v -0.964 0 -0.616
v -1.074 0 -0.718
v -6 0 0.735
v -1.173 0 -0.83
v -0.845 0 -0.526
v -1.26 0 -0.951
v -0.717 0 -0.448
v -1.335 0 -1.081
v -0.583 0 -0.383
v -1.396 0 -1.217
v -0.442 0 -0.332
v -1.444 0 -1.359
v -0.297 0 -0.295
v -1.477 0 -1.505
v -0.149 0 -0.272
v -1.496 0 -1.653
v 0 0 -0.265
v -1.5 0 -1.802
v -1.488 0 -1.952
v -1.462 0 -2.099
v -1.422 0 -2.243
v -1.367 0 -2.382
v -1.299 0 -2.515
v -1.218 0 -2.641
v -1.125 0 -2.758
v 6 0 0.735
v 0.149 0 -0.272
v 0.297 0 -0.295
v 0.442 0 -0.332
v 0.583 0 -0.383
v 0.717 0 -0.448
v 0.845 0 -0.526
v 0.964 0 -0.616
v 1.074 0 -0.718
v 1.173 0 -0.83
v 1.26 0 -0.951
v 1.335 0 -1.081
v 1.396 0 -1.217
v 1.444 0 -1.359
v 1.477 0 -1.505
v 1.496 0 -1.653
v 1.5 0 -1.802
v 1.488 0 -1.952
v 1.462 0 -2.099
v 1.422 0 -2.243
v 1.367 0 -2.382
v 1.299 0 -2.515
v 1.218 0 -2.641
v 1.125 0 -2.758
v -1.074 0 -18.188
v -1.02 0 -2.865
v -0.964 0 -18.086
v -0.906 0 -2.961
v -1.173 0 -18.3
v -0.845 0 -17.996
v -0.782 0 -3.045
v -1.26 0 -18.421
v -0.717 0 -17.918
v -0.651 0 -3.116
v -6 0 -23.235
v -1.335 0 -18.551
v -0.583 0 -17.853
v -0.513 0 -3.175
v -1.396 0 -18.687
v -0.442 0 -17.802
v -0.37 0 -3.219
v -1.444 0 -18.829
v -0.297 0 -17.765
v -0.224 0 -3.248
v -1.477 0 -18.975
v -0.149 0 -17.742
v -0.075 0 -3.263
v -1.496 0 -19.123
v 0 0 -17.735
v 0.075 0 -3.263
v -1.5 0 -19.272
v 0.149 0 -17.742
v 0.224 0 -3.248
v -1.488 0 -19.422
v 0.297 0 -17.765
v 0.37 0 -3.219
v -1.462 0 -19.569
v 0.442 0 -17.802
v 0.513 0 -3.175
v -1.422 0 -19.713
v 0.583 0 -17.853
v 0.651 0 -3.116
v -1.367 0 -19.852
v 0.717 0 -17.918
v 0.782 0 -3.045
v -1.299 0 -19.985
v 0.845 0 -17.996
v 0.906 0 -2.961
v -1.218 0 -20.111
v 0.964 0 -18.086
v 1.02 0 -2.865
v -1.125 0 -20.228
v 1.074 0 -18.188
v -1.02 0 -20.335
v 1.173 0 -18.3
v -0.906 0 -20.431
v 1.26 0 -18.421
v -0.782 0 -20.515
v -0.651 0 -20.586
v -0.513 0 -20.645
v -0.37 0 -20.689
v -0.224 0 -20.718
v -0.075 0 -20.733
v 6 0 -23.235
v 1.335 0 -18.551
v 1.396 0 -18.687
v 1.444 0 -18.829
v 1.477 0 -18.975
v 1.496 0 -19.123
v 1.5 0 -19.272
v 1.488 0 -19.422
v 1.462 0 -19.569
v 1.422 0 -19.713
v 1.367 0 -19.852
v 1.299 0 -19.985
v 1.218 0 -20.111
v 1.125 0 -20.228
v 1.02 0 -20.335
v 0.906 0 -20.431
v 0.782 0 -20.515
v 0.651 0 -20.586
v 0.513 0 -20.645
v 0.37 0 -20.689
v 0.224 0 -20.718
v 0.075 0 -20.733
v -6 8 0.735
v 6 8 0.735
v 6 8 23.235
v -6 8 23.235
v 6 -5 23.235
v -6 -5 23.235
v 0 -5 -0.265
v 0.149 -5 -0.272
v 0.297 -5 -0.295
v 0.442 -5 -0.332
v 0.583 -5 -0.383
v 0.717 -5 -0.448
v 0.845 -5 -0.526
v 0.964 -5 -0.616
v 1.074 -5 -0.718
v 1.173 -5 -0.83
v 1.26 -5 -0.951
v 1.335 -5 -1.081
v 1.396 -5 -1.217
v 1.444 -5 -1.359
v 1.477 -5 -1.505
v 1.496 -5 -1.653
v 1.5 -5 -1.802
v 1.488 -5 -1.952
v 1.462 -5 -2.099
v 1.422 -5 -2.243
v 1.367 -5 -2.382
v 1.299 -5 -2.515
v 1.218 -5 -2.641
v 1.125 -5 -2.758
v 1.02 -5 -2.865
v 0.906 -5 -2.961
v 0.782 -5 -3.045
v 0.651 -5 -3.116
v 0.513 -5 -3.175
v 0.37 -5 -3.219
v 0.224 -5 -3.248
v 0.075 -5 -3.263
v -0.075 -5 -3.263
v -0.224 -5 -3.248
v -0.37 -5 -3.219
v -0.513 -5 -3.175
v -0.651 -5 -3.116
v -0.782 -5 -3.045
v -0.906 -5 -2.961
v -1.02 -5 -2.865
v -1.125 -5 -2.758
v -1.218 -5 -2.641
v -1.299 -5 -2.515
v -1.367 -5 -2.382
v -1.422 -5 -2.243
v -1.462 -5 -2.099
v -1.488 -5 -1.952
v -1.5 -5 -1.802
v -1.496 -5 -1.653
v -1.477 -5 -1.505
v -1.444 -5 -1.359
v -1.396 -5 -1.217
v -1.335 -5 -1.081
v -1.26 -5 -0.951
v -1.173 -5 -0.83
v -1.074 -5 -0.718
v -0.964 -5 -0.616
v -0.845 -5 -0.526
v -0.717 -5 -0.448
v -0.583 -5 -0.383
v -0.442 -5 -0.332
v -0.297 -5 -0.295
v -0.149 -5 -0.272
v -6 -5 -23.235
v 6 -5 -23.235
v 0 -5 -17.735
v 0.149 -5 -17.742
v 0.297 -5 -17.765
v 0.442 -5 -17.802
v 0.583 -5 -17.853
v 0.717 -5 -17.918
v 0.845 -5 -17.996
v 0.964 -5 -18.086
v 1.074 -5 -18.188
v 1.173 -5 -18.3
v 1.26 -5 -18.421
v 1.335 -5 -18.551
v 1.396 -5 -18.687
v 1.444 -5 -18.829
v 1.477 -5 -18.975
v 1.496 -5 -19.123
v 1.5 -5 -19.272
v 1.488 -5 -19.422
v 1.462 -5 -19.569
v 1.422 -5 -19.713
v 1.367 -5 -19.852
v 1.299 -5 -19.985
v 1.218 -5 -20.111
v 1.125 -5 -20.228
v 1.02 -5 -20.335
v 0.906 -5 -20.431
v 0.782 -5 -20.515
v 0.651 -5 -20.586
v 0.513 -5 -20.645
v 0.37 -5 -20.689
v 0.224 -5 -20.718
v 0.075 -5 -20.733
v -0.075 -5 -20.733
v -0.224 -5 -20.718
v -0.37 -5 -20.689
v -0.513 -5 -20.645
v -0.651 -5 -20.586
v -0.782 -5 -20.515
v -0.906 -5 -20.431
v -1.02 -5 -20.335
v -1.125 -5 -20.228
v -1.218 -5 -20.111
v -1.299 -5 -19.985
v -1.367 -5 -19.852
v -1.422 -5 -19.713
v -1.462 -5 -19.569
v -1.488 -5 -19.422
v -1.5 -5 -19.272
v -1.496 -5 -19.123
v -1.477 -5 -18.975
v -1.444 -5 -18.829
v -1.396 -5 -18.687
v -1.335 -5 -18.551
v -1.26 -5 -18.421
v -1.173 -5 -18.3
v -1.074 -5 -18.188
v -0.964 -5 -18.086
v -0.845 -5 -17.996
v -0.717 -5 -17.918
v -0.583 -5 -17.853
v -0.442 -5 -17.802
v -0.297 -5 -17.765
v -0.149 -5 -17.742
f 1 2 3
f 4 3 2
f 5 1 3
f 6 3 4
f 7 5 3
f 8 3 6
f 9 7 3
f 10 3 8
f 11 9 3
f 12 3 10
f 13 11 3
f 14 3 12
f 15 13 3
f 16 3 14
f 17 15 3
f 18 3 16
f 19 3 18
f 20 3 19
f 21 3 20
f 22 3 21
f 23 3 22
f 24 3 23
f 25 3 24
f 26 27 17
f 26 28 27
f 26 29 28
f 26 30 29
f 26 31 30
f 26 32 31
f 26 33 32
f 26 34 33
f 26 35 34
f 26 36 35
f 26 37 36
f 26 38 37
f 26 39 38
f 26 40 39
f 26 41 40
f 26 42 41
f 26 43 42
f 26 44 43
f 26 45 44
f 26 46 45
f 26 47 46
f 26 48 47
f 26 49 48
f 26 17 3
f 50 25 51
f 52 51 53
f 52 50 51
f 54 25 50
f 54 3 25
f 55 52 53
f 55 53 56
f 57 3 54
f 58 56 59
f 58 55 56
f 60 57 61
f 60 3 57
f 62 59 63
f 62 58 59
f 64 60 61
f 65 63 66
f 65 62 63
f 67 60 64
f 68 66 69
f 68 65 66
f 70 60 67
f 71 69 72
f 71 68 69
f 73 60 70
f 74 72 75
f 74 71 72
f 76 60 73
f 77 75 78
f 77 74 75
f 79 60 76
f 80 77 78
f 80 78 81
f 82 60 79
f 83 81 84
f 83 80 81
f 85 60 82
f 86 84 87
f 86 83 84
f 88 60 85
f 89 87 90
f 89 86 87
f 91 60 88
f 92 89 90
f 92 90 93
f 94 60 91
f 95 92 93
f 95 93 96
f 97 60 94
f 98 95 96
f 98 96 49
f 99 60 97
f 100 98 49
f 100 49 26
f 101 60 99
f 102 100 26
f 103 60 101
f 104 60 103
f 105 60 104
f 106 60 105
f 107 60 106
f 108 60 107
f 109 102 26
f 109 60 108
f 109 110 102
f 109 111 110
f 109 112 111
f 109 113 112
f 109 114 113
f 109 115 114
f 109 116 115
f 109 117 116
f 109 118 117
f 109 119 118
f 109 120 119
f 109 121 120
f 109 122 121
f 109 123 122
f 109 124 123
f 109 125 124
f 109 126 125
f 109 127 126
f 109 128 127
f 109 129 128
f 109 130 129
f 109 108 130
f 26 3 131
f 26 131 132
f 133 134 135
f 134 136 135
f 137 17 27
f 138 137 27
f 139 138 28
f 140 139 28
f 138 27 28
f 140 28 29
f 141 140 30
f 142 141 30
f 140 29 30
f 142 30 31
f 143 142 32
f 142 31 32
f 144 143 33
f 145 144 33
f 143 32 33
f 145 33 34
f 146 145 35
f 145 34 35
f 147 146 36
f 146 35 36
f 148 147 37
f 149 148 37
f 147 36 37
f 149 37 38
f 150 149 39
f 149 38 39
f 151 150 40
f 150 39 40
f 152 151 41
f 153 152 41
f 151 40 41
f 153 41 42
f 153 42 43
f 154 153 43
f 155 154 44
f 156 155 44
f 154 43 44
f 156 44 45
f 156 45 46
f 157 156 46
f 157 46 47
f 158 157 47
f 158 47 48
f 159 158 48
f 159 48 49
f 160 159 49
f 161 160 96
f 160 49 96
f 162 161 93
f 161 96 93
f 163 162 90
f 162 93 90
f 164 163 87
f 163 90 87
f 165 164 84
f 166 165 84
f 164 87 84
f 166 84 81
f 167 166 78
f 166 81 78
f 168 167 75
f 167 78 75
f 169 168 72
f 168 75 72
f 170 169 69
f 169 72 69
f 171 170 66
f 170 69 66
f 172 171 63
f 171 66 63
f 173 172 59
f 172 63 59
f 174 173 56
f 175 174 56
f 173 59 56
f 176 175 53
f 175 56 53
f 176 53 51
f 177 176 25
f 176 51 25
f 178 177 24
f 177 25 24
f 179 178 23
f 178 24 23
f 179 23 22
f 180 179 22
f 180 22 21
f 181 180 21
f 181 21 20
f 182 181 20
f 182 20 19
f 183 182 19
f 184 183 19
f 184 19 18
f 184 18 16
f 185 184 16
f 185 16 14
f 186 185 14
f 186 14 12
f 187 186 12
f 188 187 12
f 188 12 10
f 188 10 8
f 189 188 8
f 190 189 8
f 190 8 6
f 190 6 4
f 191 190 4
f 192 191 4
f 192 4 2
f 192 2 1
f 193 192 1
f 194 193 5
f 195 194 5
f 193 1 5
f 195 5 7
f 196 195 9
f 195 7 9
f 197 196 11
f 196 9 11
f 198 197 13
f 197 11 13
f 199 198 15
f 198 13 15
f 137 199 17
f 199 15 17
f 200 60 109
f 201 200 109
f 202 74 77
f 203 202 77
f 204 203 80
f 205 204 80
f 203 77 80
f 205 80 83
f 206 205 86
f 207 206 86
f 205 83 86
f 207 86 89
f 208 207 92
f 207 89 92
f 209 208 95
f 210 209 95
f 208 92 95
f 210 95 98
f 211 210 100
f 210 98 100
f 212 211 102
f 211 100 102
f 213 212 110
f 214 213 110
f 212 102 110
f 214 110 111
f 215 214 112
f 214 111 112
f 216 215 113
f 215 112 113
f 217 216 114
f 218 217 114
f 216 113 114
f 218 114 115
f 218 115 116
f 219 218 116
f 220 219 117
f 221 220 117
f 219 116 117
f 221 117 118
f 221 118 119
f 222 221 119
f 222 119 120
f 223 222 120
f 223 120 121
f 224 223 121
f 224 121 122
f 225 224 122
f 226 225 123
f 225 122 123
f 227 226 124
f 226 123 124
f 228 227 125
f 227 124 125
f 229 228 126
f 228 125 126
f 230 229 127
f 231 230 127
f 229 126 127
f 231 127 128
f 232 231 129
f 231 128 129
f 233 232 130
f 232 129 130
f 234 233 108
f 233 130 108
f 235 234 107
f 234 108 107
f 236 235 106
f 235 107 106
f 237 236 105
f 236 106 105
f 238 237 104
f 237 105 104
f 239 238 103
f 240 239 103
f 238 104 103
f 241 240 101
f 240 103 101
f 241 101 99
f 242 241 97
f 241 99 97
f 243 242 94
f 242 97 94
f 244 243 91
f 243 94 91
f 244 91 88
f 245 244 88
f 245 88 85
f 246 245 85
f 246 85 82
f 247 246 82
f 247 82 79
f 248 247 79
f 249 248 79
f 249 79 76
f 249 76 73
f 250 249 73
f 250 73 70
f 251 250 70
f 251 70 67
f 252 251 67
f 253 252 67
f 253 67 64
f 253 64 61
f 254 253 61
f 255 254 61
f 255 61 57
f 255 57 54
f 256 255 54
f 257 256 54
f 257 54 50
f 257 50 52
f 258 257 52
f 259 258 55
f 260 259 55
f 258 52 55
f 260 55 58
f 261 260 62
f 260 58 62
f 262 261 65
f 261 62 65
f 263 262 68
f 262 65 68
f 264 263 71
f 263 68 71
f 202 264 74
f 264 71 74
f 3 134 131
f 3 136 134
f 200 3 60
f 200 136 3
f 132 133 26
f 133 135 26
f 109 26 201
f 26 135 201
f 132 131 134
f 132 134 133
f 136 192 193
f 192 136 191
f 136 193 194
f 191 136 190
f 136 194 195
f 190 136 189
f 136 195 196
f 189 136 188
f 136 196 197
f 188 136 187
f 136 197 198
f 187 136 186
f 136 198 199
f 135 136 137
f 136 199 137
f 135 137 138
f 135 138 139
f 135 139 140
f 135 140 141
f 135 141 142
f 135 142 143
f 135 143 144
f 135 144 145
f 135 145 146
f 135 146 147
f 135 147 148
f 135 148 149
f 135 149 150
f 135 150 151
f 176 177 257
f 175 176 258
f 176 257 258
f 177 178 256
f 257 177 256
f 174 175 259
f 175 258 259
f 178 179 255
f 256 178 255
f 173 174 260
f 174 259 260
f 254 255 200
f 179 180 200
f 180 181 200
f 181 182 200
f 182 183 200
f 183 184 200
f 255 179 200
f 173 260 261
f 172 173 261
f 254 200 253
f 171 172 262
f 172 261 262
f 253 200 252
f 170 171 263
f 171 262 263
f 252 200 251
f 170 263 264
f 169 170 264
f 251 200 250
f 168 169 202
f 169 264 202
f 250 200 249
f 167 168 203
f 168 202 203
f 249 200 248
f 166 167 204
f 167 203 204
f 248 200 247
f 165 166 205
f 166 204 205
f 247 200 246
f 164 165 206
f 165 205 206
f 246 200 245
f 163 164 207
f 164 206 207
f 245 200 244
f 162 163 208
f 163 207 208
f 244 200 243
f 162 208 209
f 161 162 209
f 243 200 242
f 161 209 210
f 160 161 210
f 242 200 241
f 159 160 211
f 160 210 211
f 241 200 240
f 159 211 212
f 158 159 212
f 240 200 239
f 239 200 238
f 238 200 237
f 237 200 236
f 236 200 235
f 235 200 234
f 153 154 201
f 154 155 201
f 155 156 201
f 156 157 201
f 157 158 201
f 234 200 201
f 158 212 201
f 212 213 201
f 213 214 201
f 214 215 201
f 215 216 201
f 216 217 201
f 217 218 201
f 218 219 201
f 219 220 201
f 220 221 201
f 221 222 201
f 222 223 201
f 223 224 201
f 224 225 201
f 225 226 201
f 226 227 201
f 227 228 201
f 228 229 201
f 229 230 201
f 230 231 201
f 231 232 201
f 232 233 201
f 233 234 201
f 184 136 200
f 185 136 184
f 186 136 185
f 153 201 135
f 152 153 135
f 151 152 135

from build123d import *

# Parameters (mm, degrees)
SKETCH1_W           = 12
SKETCH1_H           = 46.47
SKETCH1_R           = 1.5
BOSS_EXTRUDE1_DEPTH = 5
SKETCH2_W           = 12
SKETCH2_H           = 22.5
BOSS_EXTRUDE2_DEPTH = 8


with BuildPart() as part:
    # Sketch1 → Boss-Extrude1 (new body)
    with BuildSketch(Plane(origin=(0, 0, 0), x_dir=(1, 0, 0), z_dir=(0, 1, 0))):
        Rectangle(SKETCH1_W, SKETCH1_H)
        with Locations(Location((0, 19.235, 0), (0, 0, 270))):
            Circle(SKETCH1_R, mode=Mode.SUBTRACT)
        with Locations(Location((0, 1.765, 0), (0, 0, 270))):
            Circle(SKETCH1_R, mode=Mode.SUBTRACT)
    extrude(amount=-BOSS_EXTRUDE1_DEPTH)

    # Sketch2 → Boss-Extrude2 (add)
    with BuildSketch(Plane(origin=(0, 0, 0), x_dir=(1, 0, 0), z_dir=(0, 1, 0))):
        with Locations((0, -11.985)):
            Rectangle(SKETCH2_W, SKETCH2_H)
    extrude(amount=BOSS_EXTRUDE2_DEPTH)


solid = part.part
